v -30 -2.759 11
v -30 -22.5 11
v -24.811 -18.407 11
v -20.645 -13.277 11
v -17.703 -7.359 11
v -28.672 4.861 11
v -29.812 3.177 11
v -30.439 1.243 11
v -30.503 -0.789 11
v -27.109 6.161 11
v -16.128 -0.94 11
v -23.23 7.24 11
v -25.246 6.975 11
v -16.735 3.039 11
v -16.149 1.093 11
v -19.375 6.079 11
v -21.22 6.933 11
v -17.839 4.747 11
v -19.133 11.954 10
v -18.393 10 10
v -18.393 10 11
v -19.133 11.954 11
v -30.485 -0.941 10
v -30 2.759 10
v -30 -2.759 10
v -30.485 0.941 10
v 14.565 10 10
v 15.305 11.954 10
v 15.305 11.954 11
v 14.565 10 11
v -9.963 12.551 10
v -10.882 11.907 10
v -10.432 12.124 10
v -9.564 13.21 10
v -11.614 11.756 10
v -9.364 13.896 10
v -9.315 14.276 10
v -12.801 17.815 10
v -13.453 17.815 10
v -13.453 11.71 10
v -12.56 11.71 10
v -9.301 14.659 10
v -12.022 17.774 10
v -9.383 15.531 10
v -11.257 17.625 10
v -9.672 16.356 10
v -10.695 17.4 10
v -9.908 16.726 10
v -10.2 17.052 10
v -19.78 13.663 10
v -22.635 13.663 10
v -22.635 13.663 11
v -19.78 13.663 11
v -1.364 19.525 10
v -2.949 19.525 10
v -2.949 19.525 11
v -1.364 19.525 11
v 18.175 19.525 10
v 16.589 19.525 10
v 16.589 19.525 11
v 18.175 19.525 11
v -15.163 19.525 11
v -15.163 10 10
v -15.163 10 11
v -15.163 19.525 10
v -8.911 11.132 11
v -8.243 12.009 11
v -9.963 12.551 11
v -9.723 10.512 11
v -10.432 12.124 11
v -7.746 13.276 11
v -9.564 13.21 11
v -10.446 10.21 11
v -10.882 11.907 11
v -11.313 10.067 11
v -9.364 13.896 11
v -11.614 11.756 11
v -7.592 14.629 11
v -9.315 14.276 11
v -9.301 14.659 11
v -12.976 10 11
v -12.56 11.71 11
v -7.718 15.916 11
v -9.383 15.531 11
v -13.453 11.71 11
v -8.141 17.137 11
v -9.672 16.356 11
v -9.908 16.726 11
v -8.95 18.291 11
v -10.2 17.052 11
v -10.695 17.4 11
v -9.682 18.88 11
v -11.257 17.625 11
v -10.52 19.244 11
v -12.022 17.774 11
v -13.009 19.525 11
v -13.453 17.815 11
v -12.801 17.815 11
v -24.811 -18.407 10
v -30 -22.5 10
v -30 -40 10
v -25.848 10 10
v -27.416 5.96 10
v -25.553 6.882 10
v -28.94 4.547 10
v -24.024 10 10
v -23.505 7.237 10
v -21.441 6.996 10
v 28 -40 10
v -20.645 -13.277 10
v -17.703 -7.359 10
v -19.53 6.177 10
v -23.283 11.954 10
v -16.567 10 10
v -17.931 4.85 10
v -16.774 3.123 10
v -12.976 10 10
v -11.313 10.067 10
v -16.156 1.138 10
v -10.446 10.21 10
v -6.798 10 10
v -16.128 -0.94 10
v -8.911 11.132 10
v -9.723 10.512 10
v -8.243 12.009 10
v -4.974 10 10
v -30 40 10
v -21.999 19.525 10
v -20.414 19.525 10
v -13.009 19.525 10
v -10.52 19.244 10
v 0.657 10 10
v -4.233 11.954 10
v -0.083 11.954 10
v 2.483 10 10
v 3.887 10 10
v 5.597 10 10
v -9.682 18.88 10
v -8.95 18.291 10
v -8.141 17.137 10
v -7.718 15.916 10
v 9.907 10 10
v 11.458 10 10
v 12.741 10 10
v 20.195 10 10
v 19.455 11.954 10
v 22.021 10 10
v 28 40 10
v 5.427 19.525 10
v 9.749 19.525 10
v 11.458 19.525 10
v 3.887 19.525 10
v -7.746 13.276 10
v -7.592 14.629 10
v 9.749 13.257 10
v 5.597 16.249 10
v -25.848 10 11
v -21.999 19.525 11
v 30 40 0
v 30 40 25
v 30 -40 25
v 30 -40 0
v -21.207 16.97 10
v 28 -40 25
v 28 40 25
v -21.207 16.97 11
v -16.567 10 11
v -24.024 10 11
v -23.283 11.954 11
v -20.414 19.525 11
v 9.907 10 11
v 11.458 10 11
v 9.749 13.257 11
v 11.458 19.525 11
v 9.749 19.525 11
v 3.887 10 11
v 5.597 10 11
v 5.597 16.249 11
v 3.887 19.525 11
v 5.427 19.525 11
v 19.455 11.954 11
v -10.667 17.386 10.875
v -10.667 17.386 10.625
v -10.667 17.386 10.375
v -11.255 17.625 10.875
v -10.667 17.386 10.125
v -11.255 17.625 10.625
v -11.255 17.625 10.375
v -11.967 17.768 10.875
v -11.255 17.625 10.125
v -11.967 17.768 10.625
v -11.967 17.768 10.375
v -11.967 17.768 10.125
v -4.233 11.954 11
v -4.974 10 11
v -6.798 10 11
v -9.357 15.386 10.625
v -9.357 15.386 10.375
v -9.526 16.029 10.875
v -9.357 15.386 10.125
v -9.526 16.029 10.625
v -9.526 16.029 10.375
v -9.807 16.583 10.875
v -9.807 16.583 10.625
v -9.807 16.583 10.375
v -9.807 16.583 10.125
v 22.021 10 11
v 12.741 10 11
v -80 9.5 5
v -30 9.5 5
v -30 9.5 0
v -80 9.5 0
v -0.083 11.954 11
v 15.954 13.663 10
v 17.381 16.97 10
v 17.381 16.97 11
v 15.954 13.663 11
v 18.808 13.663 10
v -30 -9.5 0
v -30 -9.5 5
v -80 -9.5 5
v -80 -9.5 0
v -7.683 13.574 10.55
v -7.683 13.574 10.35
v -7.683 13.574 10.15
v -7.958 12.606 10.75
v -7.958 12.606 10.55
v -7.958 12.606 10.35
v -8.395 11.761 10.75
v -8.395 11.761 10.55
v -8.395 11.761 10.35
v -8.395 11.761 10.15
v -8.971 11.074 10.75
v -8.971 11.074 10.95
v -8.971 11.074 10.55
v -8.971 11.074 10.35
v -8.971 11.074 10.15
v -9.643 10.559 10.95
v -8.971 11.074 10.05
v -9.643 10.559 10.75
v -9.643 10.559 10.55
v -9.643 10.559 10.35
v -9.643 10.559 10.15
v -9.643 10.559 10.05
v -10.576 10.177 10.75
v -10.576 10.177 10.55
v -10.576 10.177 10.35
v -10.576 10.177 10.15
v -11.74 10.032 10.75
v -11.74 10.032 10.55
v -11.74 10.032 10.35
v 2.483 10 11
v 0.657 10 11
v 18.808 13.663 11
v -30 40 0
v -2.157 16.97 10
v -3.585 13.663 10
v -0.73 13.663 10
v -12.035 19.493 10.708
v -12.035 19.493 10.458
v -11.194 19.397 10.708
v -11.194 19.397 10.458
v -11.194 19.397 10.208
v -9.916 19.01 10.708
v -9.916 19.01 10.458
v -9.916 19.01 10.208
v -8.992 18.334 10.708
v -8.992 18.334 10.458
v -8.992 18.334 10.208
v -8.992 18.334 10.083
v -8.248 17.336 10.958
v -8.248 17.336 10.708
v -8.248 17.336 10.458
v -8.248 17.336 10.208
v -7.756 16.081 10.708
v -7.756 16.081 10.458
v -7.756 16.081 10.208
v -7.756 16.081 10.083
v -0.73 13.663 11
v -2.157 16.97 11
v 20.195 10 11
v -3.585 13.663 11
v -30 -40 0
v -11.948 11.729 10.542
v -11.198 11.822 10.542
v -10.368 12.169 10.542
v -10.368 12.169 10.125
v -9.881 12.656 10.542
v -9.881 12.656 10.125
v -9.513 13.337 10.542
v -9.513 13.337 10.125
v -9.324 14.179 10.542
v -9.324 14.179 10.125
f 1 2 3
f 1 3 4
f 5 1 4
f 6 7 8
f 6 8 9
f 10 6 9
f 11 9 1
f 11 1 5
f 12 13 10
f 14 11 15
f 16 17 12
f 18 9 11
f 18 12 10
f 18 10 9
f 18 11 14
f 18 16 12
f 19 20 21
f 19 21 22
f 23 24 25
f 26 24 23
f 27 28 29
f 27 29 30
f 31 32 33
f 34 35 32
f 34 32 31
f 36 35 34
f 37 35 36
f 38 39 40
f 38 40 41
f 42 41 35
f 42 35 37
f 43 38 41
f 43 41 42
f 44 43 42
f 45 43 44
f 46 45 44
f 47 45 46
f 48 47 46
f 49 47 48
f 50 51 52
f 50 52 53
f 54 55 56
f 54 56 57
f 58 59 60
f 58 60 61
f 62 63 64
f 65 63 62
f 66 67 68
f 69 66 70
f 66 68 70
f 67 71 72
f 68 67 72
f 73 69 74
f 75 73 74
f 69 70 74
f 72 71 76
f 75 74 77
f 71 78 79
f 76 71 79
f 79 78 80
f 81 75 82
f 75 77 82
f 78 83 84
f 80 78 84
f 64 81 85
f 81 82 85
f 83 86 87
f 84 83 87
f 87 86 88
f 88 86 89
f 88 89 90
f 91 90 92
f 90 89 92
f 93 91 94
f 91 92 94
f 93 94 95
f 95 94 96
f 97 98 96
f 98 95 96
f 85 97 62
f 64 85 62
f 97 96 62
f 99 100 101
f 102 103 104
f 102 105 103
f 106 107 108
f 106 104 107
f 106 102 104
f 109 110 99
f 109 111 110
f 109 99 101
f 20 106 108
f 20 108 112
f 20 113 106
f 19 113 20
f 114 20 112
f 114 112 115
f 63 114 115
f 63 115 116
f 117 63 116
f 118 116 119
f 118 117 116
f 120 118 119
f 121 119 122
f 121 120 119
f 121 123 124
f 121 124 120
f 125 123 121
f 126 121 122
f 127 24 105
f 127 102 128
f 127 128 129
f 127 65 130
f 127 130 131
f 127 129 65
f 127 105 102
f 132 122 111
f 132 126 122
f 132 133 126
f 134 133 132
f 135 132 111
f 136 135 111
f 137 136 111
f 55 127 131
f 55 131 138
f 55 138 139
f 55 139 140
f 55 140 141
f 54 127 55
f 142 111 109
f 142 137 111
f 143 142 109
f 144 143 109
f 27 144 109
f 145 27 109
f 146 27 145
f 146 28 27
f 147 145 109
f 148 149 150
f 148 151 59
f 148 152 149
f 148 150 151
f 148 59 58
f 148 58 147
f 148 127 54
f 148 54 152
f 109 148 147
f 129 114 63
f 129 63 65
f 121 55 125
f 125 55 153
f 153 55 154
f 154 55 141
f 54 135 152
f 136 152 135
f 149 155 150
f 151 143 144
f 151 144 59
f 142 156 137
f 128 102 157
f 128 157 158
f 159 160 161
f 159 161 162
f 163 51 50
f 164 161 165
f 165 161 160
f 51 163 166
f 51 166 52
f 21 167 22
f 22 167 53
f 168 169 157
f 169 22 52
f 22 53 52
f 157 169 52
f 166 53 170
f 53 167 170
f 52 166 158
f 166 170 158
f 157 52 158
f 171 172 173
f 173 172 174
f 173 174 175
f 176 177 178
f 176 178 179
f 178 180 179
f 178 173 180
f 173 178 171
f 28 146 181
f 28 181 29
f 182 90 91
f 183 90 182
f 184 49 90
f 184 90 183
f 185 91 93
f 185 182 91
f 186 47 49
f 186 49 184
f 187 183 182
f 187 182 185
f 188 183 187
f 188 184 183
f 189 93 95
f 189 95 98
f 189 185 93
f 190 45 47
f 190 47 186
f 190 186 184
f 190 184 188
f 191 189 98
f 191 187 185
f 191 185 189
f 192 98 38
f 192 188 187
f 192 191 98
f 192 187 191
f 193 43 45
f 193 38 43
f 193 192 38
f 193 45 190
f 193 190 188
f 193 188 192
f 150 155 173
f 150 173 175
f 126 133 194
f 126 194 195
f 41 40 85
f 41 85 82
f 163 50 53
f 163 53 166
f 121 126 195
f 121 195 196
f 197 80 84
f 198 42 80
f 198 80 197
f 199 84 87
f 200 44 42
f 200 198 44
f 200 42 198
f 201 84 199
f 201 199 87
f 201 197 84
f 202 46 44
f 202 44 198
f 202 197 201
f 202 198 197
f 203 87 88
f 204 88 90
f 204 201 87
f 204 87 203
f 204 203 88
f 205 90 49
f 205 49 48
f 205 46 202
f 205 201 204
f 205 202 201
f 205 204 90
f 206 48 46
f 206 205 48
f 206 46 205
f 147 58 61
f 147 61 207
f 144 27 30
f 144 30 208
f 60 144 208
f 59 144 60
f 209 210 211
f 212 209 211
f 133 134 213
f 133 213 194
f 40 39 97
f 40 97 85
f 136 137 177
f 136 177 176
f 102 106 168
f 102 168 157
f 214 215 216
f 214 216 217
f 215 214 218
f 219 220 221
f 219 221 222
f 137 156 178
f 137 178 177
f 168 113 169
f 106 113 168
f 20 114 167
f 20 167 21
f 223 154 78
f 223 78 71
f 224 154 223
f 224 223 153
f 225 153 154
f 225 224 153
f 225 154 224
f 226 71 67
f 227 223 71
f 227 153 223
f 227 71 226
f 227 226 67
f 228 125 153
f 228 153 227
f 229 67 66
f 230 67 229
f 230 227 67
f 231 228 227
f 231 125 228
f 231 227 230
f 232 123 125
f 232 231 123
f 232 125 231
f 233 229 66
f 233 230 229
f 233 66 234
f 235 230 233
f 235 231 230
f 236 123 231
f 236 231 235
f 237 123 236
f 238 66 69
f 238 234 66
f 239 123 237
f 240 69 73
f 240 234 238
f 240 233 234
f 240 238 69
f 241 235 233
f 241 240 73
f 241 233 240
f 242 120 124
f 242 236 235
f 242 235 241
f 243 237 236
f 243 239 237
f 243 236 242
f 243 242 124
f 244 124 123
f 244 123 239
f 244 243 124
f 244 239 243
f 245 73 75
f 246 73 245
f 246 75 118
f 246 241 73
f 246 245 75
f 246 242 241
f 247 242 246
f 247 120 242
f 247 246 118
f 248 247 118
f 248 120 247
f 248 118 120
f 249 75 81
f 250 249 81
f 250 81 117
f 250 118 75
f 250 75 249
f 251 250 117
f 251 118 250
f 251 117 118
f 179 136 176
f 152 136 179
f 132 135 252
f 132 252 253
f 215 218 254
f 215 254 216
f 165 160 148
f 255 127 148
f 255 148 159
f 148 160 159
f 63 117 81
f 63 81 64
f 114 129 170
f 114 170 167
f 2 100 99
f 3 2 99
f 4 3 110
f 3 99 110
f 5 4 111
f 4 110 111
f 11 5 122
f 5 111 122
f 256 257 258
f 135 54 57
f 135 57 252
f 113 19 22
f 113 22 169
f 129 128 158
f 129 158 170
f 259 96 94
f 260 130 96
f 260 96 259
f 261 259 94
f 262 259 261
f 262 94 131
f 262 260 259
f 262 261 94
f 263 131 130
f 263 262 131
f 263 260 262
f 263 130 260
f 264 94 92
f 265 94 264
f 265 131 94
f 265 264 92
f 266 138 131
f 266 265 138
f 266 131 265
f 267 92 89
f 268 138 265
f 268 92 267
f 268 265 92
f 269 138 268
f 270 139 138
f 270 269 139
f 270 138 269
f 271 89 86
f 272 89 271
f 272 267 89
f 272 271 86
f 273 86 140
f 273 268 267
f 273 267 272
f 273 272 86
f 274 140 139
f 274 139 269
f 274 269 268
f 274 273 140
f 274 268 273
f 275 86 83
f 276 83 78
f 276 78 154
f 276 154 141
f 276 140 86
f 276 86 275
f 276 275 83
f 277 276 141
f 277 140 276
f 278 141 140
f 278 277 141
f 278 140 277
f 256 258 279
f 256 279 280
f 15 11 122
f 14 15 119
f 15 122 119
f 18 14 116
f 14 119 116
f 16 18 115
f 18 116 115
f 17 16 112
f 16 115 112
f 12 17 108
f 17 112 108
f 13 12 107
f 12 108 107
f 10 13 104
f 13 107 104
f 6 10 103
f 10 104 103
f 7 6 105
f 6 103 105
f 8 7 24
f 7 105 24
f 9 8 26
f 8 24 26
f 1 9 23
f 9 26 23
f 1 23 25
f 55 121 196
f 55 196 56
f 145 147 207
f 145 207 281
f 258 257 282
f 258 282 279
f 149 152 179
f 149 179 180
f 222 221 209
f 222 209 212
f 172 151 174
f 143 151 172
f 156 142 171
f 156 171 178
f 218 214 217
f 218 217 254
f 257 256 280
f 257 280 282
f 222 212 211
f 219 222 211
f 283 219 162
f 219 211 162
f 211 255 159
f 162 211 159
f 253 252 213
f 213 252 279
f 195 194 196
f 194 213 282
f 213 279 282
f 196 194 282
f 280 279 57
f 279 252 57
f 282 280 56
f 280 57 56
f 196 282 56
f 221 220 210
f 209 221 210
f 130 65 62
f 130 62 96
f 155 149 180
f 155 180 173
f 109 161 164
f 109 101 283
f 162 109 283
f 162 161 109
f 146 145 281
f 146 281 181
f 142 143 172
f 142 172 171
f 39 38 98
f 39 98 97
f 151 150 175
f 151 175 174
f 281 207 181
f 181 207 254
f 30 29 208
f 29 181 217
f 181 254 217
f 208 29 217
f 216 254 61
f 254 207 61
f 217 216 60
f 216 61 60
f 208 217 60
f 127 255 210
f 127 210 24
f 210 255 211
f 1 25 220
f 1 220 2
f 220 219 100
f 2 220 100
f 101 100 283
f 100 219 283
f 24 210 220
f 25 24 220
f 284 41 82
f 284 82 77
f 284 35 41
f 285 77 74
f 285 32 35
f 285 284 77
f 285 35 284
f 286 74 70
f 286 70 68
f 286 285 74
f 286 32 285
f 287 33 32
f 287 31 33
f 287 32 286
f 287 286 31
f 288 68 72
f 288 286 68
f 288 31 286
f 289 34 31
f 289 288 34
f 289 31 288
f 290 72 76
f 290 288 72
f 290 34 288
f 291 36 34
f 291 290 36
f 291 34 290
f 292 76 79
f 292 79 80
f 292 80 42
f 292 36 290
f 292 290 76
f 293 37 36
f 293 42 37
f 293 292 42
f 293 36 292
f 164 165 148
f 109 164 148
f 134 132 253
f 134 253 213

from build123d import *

# Parameters (mm, degrees)
IZIM1_W                     = 60
IZIM1_H                     = 80
Y_KSEKLIK_EKSTR_ZYON1_DEPTH = 10
IZIM2_W                     = 5
IZIM2_H                     = 19
Y_KSEKLIK_EKSTR_ZYON2_DEPTH = 50
IZIM3_W                     = 15
IZIM3_H                     = 80
Y_KSEKLIK_EKSTR_ZYON3_DEPTH = 2
Y_KSEKLIK_EKSTR_ZYON4_DEPTH = 1


with BuildPart() as part:
    # Çizim1 → Yükseklik-Ekstrüzyon1 (new body)
    with BuildSketch(Plane.XY):
        Rectangle(IZIM1_W, IZIM1_H)
    extrude(amount=Y_KSEKLIK_EKSTR_ZYON1_DEPTH)

    # Çizim2 → Yükseklik-Ekstrüzyon2 (add)
    with BuildSketch(Plane(origin=(-30, 0, 0), x_dir=(0, 0, -1), z_dir=(1, 0, 0))):
        with Locations((-2.5, 0)):
            Rectangle(IZIM2_W, IZIM2_H)
    extrude(amount=-Y_KSEKLIK_EKSTR_ZYON2_DEPTH)

    # Çizim3 → Yükseklik-Ekstrüzyon3 (add)
    with BuildSketch(Plane(origin=(30, 0, 0), x_dir=(0, 0, -1), z_dir=(1, 0, 0))):
        with Locations((-17.5, 0)):
            Rectangle(IZIM3_W, IZIM3_H)
    extrude(amount=-Y_KSEKLIK_EKSTR_ZYON3_DEPTH)

    # Çizim4 → Yükseklik-Ekstrüzyon4 (add)
    # profile 1 of 6: a face of its own
    with BuildSketch(Plane.XY.offset(10)):
        with BuildLine():
            Line((-30, -2.758821569), (-30, -22.5))
            ThreePointArc((-30, -22.5), (-20.644812954, -13.276725535), (-16.127578533, -0.940481791))
            ThreePointArc((-16.127578533, -0.940481791), (-24.247174638, 7.178595313), (-30, -2.758821569))
        make_face()
    # profile 2 of 6: a face of its own
    with BuildSketch(Plane.XY.offset(10)):
        Polygon((-21.999298336, 19.525), (-20.413706389, 19.525), (-16.567071773, 10), (-18.393078384, 10), (-19.133402903, 11.953846154), (-23.283417927, 11.953846154), (-24.023742447, 10), (-25.847841004, 10), align=None)
        Polygon((-21.207456389, 16.970117188), (-22.634679947, 13.663461538), (-19.780232831, 13.663461538), align=None, mode=Mode.SUBTRACT)
    # profile 3 of 6: a face of its own
    with BuildSketch(Plane.XY.offset(10)):
        with BuildLine():
            Line((-15.16274485, 19.525), (-13.008553144, 19.525))
            add(Edge.make_bspline(
                [(-13.008553144, 19.525), (-12.840609123, 19.523826014), (-12.515971431, 19.521556685), (-12.04563564, 19.49598681), (-11.608283206, 19.456662156), (-11.203632202, 19.402563969), (-10.832512229, 19.330977253), (-10.495401839, 19.241185748), (-10.191169607, 19.137536394), (-9.916479691, 19.015571895), (-9.665714218, 18.873373403), (-9.427604398, 18.714975699), (-9.202617755, 18.534576213), (-8.987596956, 18.335655209), (-8.78531689, 18.11457349), (-8.592408871, 17.874992969), (-8.41359616, 17.613439399), (-8.243473638, 17.336184009), (-8.089620454, 17.042051817), (-7.955423958, 16.733546416), (-7.843006739, 16.412653152), (-7.751661928, 16.079030037), (-7.678849571, 15.733784598), (-7.627904232, 15.376220162), (-7.596409316, 15.006667774), (-7.59321442, 14.756203976), (-7.591591004, 14.628936298)],
                knots=[0, 0, 0, 0, 1.44355588, 2.790409838, 4.047694926, 5.217575253, 6.298404546, 7.294384826, 8.214239204, 9.058592145, 9.873746385, 10.689560431, 11.514393297, 12.350027578, 13.205127629, 14.088021785, 14.991911688, 15.926770944, 16.882954281, 17.842803888, 18.816321264, 19.80318086, 20.814351908, 21.847355356, 22.906180909, 24, 24, 24, 24], degree=3))
            add(Edge.make_bspline(
                [(-7.591591004, 14.628936298), (-7.595841984, 14.449353321), (-7.604210287, 14.095833719), (-7.674700195, 13.577047775), (-7.788706245, 13.079739705), (-7.949009105, 12.607799646), (-8.14774174, 12.165430293), (-8.385150126, 11.760432644), (-8.657753303, 11.394980521), (-8.962375429, 11.070893577), (-9.292207001, 10.792336456), (-9.634968515, 10.553772666), (-9.993999093, 10.365645212), (-10.310355209, 10.246344273), (-10.584675428, 10.172149411), (-10.825525613, 10.128299533), (-11.099106848, 10.08808655), (-11.407970042, 10.057010822), (-11.750760277, 10.029298909), (-12.12884392, 10.014241334), (-12.540996845, 10.001730724), (-12.827276021, 10.000592025), (-12.976116245, 10)],
                knots=[0, 0, 0, 0, 1.315458931, 2.589557908, 3.828601765, 5.048913369, 6.235739168, 7.376350998, 8.481830359, 9.569842114, 10.627874879, 11.640079404, 12.624025415, 13.590060155, 14.111227486, 14.704434459, 15.382649715, 16.137166398, 16.978595427, 17.902333227, 18.909396075, 20, 20, 20, 20], degree=3))
            Line((-12.976116245, 10), (-15.16274485, 10))
            Line((-15.16274485, 10), (-15.16274485, 19.525))
        make_face()
        with BuildLine():
            Line((-13.453129466, 17.815384615), (-13.453129466, 11.709615385))
            Line((-13.453129466, 11.709615385), (-12.560160716, 11.709615385))
            add(Edge.make_bspline(
                [(-12.560160716, 11.709615385), (-12.453911148, 11.709810078), (-12.24955786, 11.710184538), (-11.954517968, 11.728020382), (-11.681680879, 11.745922652), (-11.431797647, 11.779901759), (-11.203049701, 11.817752093), (-10.998579438, 11.870426015), (-10.814171838, 11.925755509), (-10.652079405, 11.996196811), (-10.503615942, 12.075483186), (-10.366155734, 12.168376365), (-10.233468148, 12.271530737), (-10.108033884, 12.387980219), (-9.989378205, 12.516182801), (-9.878203152, 12.656799054), (-9.773024833, 12.809399953), (-9.676542976, 12.974792337), (-9.588377338, 13.151229626), (-9.510164538, 13.337002767), (-9.445314586, 13.53365885), (-9.391415276, 13.739356938), (-9.352898107, 13.955887866), (-9.321032497, 14.181647819), (-9.304604846, 14.41753124), (-9.302350253, 14.578034203), (-9.301206389, 14.659465144)],
                knots=[0, 0, 0, 0, 1.50275155, 2.890291501, 4.180787663, 5.369391935, 6.45668281, 7.458360028, 8.354766181, 9.177074746, 9.954075863, 10.732690366, 11.5210699, 12.329727389, 13.151100085, 13.990027547, 14.863562427, 15.770965086, 16.696477834, 17.652329173, 18.619756807, 19.62365428, 20.657822005, 21.729286259, 22.847956731, 24, 24, 24, 24], degree=3))
            add(Edge.make_bspline(
                [(-9.301206389, 14.659465144), (-9.303484578, 14.784250364), (-9.307926871, 15.027571875), (-9.350767379, 15.381974966), (-9.420503555, 15.715698568), (-9.520010358, 16.027504143), (-9.645441767, 16.318268029), (-9.802448416, 16.58552684), (-9.984273341, 16.833770156), (-10.12805553, 16.97939765), (-10.199899298, 17.052163462)],
                knots=[0, 0, 0, 0, 1.13821349, 2.219428113, 3.251817212, 4.244760574, 5.201143372, 6.134805572, 7.068016741, 8, 8, 8, 8], degree=3))
            add(Edge.make_bspline(
                [(-10.199899298, 17.052163462), (-10.270744054, 17.11416977), (-10.415436449, 17.240810634), (-10.669468745, 17.392558776), (-10.949399178, 17.525884392), (-11.261631718, 17.631596738), (-11.603148776, 17.715198567), (-11.975984434, 17.772856704), (-12.378142077, 17.809907212), (-12.656747521, 17.813519698), (-12.800575379, 17.815384615)],
                knots=[0, 0, 0, 0, 0.813307809, 1.661089106, 2.549956539, 3.493439533, 4.508053171, 5.589449661, 6.755572447, 8, 8, 8, 8], degree=3))
            Line((-12.800575379, 17.815384615), (-13.453129466, 17.815384615))
        make_face(mode=Mode.SUBTRACT)
    # profile 4 of 6: a face of its own
    with BuildSketch(Plane.XY.offset(10)):
        Polygon((-2.949298336, 19.525), (-1.363706389, 19.525), (2.482928227, 10), (0.656921616, 10), (-0.083402903, 11.953846154), (-4.233417927, 11.953846154), (-4.973742447, 10), (-6.797841004, 10), align=None)
        Polygon((-2.157456389, 16.970117188), (-3.584679947, 13.663461538), (-0.730232831, 13.663461538), align=None, mode=Mode.SUBTRACT)
    # profile 5 of 6: a face of its own
    with BuildSketch(Plane.XY.offset(10)):
        Polygon((3.88725515, 19.525), (5.427053827, 19.525), (9.748793611, 13.257046274), (9.748793611, 19.525), (11.458408996, 19.525), (11.458408996, 10), (9.907162001, 10), (5.596870534, 16.248873197), (5.596870534, 10), (3.88725515, 10), align=None)
    # profile 6 of 6: a face of its own
    with BuildSketch(Plane.XY.offset(10)):
        Polygon((16.589163202, 19.525), (18.17475515, 19.525), (22.021389765, 10), (20.195383154, 10), (19.455058635, 11.953846154), (15.305043611, 11.953846154), (14.564719092, 10), (12.740620534, 10), align=None)
        Polygon((17.38100515, 16.970117188), (15.953781592, 13.663461538), (18.808228707, 13.663461538), align=None, mode=Mode.SUBTRACT)
    extrude(amount=Y_KSEKLIK_EKSTR_ZYON4_DEPTH)


solid = part.part
